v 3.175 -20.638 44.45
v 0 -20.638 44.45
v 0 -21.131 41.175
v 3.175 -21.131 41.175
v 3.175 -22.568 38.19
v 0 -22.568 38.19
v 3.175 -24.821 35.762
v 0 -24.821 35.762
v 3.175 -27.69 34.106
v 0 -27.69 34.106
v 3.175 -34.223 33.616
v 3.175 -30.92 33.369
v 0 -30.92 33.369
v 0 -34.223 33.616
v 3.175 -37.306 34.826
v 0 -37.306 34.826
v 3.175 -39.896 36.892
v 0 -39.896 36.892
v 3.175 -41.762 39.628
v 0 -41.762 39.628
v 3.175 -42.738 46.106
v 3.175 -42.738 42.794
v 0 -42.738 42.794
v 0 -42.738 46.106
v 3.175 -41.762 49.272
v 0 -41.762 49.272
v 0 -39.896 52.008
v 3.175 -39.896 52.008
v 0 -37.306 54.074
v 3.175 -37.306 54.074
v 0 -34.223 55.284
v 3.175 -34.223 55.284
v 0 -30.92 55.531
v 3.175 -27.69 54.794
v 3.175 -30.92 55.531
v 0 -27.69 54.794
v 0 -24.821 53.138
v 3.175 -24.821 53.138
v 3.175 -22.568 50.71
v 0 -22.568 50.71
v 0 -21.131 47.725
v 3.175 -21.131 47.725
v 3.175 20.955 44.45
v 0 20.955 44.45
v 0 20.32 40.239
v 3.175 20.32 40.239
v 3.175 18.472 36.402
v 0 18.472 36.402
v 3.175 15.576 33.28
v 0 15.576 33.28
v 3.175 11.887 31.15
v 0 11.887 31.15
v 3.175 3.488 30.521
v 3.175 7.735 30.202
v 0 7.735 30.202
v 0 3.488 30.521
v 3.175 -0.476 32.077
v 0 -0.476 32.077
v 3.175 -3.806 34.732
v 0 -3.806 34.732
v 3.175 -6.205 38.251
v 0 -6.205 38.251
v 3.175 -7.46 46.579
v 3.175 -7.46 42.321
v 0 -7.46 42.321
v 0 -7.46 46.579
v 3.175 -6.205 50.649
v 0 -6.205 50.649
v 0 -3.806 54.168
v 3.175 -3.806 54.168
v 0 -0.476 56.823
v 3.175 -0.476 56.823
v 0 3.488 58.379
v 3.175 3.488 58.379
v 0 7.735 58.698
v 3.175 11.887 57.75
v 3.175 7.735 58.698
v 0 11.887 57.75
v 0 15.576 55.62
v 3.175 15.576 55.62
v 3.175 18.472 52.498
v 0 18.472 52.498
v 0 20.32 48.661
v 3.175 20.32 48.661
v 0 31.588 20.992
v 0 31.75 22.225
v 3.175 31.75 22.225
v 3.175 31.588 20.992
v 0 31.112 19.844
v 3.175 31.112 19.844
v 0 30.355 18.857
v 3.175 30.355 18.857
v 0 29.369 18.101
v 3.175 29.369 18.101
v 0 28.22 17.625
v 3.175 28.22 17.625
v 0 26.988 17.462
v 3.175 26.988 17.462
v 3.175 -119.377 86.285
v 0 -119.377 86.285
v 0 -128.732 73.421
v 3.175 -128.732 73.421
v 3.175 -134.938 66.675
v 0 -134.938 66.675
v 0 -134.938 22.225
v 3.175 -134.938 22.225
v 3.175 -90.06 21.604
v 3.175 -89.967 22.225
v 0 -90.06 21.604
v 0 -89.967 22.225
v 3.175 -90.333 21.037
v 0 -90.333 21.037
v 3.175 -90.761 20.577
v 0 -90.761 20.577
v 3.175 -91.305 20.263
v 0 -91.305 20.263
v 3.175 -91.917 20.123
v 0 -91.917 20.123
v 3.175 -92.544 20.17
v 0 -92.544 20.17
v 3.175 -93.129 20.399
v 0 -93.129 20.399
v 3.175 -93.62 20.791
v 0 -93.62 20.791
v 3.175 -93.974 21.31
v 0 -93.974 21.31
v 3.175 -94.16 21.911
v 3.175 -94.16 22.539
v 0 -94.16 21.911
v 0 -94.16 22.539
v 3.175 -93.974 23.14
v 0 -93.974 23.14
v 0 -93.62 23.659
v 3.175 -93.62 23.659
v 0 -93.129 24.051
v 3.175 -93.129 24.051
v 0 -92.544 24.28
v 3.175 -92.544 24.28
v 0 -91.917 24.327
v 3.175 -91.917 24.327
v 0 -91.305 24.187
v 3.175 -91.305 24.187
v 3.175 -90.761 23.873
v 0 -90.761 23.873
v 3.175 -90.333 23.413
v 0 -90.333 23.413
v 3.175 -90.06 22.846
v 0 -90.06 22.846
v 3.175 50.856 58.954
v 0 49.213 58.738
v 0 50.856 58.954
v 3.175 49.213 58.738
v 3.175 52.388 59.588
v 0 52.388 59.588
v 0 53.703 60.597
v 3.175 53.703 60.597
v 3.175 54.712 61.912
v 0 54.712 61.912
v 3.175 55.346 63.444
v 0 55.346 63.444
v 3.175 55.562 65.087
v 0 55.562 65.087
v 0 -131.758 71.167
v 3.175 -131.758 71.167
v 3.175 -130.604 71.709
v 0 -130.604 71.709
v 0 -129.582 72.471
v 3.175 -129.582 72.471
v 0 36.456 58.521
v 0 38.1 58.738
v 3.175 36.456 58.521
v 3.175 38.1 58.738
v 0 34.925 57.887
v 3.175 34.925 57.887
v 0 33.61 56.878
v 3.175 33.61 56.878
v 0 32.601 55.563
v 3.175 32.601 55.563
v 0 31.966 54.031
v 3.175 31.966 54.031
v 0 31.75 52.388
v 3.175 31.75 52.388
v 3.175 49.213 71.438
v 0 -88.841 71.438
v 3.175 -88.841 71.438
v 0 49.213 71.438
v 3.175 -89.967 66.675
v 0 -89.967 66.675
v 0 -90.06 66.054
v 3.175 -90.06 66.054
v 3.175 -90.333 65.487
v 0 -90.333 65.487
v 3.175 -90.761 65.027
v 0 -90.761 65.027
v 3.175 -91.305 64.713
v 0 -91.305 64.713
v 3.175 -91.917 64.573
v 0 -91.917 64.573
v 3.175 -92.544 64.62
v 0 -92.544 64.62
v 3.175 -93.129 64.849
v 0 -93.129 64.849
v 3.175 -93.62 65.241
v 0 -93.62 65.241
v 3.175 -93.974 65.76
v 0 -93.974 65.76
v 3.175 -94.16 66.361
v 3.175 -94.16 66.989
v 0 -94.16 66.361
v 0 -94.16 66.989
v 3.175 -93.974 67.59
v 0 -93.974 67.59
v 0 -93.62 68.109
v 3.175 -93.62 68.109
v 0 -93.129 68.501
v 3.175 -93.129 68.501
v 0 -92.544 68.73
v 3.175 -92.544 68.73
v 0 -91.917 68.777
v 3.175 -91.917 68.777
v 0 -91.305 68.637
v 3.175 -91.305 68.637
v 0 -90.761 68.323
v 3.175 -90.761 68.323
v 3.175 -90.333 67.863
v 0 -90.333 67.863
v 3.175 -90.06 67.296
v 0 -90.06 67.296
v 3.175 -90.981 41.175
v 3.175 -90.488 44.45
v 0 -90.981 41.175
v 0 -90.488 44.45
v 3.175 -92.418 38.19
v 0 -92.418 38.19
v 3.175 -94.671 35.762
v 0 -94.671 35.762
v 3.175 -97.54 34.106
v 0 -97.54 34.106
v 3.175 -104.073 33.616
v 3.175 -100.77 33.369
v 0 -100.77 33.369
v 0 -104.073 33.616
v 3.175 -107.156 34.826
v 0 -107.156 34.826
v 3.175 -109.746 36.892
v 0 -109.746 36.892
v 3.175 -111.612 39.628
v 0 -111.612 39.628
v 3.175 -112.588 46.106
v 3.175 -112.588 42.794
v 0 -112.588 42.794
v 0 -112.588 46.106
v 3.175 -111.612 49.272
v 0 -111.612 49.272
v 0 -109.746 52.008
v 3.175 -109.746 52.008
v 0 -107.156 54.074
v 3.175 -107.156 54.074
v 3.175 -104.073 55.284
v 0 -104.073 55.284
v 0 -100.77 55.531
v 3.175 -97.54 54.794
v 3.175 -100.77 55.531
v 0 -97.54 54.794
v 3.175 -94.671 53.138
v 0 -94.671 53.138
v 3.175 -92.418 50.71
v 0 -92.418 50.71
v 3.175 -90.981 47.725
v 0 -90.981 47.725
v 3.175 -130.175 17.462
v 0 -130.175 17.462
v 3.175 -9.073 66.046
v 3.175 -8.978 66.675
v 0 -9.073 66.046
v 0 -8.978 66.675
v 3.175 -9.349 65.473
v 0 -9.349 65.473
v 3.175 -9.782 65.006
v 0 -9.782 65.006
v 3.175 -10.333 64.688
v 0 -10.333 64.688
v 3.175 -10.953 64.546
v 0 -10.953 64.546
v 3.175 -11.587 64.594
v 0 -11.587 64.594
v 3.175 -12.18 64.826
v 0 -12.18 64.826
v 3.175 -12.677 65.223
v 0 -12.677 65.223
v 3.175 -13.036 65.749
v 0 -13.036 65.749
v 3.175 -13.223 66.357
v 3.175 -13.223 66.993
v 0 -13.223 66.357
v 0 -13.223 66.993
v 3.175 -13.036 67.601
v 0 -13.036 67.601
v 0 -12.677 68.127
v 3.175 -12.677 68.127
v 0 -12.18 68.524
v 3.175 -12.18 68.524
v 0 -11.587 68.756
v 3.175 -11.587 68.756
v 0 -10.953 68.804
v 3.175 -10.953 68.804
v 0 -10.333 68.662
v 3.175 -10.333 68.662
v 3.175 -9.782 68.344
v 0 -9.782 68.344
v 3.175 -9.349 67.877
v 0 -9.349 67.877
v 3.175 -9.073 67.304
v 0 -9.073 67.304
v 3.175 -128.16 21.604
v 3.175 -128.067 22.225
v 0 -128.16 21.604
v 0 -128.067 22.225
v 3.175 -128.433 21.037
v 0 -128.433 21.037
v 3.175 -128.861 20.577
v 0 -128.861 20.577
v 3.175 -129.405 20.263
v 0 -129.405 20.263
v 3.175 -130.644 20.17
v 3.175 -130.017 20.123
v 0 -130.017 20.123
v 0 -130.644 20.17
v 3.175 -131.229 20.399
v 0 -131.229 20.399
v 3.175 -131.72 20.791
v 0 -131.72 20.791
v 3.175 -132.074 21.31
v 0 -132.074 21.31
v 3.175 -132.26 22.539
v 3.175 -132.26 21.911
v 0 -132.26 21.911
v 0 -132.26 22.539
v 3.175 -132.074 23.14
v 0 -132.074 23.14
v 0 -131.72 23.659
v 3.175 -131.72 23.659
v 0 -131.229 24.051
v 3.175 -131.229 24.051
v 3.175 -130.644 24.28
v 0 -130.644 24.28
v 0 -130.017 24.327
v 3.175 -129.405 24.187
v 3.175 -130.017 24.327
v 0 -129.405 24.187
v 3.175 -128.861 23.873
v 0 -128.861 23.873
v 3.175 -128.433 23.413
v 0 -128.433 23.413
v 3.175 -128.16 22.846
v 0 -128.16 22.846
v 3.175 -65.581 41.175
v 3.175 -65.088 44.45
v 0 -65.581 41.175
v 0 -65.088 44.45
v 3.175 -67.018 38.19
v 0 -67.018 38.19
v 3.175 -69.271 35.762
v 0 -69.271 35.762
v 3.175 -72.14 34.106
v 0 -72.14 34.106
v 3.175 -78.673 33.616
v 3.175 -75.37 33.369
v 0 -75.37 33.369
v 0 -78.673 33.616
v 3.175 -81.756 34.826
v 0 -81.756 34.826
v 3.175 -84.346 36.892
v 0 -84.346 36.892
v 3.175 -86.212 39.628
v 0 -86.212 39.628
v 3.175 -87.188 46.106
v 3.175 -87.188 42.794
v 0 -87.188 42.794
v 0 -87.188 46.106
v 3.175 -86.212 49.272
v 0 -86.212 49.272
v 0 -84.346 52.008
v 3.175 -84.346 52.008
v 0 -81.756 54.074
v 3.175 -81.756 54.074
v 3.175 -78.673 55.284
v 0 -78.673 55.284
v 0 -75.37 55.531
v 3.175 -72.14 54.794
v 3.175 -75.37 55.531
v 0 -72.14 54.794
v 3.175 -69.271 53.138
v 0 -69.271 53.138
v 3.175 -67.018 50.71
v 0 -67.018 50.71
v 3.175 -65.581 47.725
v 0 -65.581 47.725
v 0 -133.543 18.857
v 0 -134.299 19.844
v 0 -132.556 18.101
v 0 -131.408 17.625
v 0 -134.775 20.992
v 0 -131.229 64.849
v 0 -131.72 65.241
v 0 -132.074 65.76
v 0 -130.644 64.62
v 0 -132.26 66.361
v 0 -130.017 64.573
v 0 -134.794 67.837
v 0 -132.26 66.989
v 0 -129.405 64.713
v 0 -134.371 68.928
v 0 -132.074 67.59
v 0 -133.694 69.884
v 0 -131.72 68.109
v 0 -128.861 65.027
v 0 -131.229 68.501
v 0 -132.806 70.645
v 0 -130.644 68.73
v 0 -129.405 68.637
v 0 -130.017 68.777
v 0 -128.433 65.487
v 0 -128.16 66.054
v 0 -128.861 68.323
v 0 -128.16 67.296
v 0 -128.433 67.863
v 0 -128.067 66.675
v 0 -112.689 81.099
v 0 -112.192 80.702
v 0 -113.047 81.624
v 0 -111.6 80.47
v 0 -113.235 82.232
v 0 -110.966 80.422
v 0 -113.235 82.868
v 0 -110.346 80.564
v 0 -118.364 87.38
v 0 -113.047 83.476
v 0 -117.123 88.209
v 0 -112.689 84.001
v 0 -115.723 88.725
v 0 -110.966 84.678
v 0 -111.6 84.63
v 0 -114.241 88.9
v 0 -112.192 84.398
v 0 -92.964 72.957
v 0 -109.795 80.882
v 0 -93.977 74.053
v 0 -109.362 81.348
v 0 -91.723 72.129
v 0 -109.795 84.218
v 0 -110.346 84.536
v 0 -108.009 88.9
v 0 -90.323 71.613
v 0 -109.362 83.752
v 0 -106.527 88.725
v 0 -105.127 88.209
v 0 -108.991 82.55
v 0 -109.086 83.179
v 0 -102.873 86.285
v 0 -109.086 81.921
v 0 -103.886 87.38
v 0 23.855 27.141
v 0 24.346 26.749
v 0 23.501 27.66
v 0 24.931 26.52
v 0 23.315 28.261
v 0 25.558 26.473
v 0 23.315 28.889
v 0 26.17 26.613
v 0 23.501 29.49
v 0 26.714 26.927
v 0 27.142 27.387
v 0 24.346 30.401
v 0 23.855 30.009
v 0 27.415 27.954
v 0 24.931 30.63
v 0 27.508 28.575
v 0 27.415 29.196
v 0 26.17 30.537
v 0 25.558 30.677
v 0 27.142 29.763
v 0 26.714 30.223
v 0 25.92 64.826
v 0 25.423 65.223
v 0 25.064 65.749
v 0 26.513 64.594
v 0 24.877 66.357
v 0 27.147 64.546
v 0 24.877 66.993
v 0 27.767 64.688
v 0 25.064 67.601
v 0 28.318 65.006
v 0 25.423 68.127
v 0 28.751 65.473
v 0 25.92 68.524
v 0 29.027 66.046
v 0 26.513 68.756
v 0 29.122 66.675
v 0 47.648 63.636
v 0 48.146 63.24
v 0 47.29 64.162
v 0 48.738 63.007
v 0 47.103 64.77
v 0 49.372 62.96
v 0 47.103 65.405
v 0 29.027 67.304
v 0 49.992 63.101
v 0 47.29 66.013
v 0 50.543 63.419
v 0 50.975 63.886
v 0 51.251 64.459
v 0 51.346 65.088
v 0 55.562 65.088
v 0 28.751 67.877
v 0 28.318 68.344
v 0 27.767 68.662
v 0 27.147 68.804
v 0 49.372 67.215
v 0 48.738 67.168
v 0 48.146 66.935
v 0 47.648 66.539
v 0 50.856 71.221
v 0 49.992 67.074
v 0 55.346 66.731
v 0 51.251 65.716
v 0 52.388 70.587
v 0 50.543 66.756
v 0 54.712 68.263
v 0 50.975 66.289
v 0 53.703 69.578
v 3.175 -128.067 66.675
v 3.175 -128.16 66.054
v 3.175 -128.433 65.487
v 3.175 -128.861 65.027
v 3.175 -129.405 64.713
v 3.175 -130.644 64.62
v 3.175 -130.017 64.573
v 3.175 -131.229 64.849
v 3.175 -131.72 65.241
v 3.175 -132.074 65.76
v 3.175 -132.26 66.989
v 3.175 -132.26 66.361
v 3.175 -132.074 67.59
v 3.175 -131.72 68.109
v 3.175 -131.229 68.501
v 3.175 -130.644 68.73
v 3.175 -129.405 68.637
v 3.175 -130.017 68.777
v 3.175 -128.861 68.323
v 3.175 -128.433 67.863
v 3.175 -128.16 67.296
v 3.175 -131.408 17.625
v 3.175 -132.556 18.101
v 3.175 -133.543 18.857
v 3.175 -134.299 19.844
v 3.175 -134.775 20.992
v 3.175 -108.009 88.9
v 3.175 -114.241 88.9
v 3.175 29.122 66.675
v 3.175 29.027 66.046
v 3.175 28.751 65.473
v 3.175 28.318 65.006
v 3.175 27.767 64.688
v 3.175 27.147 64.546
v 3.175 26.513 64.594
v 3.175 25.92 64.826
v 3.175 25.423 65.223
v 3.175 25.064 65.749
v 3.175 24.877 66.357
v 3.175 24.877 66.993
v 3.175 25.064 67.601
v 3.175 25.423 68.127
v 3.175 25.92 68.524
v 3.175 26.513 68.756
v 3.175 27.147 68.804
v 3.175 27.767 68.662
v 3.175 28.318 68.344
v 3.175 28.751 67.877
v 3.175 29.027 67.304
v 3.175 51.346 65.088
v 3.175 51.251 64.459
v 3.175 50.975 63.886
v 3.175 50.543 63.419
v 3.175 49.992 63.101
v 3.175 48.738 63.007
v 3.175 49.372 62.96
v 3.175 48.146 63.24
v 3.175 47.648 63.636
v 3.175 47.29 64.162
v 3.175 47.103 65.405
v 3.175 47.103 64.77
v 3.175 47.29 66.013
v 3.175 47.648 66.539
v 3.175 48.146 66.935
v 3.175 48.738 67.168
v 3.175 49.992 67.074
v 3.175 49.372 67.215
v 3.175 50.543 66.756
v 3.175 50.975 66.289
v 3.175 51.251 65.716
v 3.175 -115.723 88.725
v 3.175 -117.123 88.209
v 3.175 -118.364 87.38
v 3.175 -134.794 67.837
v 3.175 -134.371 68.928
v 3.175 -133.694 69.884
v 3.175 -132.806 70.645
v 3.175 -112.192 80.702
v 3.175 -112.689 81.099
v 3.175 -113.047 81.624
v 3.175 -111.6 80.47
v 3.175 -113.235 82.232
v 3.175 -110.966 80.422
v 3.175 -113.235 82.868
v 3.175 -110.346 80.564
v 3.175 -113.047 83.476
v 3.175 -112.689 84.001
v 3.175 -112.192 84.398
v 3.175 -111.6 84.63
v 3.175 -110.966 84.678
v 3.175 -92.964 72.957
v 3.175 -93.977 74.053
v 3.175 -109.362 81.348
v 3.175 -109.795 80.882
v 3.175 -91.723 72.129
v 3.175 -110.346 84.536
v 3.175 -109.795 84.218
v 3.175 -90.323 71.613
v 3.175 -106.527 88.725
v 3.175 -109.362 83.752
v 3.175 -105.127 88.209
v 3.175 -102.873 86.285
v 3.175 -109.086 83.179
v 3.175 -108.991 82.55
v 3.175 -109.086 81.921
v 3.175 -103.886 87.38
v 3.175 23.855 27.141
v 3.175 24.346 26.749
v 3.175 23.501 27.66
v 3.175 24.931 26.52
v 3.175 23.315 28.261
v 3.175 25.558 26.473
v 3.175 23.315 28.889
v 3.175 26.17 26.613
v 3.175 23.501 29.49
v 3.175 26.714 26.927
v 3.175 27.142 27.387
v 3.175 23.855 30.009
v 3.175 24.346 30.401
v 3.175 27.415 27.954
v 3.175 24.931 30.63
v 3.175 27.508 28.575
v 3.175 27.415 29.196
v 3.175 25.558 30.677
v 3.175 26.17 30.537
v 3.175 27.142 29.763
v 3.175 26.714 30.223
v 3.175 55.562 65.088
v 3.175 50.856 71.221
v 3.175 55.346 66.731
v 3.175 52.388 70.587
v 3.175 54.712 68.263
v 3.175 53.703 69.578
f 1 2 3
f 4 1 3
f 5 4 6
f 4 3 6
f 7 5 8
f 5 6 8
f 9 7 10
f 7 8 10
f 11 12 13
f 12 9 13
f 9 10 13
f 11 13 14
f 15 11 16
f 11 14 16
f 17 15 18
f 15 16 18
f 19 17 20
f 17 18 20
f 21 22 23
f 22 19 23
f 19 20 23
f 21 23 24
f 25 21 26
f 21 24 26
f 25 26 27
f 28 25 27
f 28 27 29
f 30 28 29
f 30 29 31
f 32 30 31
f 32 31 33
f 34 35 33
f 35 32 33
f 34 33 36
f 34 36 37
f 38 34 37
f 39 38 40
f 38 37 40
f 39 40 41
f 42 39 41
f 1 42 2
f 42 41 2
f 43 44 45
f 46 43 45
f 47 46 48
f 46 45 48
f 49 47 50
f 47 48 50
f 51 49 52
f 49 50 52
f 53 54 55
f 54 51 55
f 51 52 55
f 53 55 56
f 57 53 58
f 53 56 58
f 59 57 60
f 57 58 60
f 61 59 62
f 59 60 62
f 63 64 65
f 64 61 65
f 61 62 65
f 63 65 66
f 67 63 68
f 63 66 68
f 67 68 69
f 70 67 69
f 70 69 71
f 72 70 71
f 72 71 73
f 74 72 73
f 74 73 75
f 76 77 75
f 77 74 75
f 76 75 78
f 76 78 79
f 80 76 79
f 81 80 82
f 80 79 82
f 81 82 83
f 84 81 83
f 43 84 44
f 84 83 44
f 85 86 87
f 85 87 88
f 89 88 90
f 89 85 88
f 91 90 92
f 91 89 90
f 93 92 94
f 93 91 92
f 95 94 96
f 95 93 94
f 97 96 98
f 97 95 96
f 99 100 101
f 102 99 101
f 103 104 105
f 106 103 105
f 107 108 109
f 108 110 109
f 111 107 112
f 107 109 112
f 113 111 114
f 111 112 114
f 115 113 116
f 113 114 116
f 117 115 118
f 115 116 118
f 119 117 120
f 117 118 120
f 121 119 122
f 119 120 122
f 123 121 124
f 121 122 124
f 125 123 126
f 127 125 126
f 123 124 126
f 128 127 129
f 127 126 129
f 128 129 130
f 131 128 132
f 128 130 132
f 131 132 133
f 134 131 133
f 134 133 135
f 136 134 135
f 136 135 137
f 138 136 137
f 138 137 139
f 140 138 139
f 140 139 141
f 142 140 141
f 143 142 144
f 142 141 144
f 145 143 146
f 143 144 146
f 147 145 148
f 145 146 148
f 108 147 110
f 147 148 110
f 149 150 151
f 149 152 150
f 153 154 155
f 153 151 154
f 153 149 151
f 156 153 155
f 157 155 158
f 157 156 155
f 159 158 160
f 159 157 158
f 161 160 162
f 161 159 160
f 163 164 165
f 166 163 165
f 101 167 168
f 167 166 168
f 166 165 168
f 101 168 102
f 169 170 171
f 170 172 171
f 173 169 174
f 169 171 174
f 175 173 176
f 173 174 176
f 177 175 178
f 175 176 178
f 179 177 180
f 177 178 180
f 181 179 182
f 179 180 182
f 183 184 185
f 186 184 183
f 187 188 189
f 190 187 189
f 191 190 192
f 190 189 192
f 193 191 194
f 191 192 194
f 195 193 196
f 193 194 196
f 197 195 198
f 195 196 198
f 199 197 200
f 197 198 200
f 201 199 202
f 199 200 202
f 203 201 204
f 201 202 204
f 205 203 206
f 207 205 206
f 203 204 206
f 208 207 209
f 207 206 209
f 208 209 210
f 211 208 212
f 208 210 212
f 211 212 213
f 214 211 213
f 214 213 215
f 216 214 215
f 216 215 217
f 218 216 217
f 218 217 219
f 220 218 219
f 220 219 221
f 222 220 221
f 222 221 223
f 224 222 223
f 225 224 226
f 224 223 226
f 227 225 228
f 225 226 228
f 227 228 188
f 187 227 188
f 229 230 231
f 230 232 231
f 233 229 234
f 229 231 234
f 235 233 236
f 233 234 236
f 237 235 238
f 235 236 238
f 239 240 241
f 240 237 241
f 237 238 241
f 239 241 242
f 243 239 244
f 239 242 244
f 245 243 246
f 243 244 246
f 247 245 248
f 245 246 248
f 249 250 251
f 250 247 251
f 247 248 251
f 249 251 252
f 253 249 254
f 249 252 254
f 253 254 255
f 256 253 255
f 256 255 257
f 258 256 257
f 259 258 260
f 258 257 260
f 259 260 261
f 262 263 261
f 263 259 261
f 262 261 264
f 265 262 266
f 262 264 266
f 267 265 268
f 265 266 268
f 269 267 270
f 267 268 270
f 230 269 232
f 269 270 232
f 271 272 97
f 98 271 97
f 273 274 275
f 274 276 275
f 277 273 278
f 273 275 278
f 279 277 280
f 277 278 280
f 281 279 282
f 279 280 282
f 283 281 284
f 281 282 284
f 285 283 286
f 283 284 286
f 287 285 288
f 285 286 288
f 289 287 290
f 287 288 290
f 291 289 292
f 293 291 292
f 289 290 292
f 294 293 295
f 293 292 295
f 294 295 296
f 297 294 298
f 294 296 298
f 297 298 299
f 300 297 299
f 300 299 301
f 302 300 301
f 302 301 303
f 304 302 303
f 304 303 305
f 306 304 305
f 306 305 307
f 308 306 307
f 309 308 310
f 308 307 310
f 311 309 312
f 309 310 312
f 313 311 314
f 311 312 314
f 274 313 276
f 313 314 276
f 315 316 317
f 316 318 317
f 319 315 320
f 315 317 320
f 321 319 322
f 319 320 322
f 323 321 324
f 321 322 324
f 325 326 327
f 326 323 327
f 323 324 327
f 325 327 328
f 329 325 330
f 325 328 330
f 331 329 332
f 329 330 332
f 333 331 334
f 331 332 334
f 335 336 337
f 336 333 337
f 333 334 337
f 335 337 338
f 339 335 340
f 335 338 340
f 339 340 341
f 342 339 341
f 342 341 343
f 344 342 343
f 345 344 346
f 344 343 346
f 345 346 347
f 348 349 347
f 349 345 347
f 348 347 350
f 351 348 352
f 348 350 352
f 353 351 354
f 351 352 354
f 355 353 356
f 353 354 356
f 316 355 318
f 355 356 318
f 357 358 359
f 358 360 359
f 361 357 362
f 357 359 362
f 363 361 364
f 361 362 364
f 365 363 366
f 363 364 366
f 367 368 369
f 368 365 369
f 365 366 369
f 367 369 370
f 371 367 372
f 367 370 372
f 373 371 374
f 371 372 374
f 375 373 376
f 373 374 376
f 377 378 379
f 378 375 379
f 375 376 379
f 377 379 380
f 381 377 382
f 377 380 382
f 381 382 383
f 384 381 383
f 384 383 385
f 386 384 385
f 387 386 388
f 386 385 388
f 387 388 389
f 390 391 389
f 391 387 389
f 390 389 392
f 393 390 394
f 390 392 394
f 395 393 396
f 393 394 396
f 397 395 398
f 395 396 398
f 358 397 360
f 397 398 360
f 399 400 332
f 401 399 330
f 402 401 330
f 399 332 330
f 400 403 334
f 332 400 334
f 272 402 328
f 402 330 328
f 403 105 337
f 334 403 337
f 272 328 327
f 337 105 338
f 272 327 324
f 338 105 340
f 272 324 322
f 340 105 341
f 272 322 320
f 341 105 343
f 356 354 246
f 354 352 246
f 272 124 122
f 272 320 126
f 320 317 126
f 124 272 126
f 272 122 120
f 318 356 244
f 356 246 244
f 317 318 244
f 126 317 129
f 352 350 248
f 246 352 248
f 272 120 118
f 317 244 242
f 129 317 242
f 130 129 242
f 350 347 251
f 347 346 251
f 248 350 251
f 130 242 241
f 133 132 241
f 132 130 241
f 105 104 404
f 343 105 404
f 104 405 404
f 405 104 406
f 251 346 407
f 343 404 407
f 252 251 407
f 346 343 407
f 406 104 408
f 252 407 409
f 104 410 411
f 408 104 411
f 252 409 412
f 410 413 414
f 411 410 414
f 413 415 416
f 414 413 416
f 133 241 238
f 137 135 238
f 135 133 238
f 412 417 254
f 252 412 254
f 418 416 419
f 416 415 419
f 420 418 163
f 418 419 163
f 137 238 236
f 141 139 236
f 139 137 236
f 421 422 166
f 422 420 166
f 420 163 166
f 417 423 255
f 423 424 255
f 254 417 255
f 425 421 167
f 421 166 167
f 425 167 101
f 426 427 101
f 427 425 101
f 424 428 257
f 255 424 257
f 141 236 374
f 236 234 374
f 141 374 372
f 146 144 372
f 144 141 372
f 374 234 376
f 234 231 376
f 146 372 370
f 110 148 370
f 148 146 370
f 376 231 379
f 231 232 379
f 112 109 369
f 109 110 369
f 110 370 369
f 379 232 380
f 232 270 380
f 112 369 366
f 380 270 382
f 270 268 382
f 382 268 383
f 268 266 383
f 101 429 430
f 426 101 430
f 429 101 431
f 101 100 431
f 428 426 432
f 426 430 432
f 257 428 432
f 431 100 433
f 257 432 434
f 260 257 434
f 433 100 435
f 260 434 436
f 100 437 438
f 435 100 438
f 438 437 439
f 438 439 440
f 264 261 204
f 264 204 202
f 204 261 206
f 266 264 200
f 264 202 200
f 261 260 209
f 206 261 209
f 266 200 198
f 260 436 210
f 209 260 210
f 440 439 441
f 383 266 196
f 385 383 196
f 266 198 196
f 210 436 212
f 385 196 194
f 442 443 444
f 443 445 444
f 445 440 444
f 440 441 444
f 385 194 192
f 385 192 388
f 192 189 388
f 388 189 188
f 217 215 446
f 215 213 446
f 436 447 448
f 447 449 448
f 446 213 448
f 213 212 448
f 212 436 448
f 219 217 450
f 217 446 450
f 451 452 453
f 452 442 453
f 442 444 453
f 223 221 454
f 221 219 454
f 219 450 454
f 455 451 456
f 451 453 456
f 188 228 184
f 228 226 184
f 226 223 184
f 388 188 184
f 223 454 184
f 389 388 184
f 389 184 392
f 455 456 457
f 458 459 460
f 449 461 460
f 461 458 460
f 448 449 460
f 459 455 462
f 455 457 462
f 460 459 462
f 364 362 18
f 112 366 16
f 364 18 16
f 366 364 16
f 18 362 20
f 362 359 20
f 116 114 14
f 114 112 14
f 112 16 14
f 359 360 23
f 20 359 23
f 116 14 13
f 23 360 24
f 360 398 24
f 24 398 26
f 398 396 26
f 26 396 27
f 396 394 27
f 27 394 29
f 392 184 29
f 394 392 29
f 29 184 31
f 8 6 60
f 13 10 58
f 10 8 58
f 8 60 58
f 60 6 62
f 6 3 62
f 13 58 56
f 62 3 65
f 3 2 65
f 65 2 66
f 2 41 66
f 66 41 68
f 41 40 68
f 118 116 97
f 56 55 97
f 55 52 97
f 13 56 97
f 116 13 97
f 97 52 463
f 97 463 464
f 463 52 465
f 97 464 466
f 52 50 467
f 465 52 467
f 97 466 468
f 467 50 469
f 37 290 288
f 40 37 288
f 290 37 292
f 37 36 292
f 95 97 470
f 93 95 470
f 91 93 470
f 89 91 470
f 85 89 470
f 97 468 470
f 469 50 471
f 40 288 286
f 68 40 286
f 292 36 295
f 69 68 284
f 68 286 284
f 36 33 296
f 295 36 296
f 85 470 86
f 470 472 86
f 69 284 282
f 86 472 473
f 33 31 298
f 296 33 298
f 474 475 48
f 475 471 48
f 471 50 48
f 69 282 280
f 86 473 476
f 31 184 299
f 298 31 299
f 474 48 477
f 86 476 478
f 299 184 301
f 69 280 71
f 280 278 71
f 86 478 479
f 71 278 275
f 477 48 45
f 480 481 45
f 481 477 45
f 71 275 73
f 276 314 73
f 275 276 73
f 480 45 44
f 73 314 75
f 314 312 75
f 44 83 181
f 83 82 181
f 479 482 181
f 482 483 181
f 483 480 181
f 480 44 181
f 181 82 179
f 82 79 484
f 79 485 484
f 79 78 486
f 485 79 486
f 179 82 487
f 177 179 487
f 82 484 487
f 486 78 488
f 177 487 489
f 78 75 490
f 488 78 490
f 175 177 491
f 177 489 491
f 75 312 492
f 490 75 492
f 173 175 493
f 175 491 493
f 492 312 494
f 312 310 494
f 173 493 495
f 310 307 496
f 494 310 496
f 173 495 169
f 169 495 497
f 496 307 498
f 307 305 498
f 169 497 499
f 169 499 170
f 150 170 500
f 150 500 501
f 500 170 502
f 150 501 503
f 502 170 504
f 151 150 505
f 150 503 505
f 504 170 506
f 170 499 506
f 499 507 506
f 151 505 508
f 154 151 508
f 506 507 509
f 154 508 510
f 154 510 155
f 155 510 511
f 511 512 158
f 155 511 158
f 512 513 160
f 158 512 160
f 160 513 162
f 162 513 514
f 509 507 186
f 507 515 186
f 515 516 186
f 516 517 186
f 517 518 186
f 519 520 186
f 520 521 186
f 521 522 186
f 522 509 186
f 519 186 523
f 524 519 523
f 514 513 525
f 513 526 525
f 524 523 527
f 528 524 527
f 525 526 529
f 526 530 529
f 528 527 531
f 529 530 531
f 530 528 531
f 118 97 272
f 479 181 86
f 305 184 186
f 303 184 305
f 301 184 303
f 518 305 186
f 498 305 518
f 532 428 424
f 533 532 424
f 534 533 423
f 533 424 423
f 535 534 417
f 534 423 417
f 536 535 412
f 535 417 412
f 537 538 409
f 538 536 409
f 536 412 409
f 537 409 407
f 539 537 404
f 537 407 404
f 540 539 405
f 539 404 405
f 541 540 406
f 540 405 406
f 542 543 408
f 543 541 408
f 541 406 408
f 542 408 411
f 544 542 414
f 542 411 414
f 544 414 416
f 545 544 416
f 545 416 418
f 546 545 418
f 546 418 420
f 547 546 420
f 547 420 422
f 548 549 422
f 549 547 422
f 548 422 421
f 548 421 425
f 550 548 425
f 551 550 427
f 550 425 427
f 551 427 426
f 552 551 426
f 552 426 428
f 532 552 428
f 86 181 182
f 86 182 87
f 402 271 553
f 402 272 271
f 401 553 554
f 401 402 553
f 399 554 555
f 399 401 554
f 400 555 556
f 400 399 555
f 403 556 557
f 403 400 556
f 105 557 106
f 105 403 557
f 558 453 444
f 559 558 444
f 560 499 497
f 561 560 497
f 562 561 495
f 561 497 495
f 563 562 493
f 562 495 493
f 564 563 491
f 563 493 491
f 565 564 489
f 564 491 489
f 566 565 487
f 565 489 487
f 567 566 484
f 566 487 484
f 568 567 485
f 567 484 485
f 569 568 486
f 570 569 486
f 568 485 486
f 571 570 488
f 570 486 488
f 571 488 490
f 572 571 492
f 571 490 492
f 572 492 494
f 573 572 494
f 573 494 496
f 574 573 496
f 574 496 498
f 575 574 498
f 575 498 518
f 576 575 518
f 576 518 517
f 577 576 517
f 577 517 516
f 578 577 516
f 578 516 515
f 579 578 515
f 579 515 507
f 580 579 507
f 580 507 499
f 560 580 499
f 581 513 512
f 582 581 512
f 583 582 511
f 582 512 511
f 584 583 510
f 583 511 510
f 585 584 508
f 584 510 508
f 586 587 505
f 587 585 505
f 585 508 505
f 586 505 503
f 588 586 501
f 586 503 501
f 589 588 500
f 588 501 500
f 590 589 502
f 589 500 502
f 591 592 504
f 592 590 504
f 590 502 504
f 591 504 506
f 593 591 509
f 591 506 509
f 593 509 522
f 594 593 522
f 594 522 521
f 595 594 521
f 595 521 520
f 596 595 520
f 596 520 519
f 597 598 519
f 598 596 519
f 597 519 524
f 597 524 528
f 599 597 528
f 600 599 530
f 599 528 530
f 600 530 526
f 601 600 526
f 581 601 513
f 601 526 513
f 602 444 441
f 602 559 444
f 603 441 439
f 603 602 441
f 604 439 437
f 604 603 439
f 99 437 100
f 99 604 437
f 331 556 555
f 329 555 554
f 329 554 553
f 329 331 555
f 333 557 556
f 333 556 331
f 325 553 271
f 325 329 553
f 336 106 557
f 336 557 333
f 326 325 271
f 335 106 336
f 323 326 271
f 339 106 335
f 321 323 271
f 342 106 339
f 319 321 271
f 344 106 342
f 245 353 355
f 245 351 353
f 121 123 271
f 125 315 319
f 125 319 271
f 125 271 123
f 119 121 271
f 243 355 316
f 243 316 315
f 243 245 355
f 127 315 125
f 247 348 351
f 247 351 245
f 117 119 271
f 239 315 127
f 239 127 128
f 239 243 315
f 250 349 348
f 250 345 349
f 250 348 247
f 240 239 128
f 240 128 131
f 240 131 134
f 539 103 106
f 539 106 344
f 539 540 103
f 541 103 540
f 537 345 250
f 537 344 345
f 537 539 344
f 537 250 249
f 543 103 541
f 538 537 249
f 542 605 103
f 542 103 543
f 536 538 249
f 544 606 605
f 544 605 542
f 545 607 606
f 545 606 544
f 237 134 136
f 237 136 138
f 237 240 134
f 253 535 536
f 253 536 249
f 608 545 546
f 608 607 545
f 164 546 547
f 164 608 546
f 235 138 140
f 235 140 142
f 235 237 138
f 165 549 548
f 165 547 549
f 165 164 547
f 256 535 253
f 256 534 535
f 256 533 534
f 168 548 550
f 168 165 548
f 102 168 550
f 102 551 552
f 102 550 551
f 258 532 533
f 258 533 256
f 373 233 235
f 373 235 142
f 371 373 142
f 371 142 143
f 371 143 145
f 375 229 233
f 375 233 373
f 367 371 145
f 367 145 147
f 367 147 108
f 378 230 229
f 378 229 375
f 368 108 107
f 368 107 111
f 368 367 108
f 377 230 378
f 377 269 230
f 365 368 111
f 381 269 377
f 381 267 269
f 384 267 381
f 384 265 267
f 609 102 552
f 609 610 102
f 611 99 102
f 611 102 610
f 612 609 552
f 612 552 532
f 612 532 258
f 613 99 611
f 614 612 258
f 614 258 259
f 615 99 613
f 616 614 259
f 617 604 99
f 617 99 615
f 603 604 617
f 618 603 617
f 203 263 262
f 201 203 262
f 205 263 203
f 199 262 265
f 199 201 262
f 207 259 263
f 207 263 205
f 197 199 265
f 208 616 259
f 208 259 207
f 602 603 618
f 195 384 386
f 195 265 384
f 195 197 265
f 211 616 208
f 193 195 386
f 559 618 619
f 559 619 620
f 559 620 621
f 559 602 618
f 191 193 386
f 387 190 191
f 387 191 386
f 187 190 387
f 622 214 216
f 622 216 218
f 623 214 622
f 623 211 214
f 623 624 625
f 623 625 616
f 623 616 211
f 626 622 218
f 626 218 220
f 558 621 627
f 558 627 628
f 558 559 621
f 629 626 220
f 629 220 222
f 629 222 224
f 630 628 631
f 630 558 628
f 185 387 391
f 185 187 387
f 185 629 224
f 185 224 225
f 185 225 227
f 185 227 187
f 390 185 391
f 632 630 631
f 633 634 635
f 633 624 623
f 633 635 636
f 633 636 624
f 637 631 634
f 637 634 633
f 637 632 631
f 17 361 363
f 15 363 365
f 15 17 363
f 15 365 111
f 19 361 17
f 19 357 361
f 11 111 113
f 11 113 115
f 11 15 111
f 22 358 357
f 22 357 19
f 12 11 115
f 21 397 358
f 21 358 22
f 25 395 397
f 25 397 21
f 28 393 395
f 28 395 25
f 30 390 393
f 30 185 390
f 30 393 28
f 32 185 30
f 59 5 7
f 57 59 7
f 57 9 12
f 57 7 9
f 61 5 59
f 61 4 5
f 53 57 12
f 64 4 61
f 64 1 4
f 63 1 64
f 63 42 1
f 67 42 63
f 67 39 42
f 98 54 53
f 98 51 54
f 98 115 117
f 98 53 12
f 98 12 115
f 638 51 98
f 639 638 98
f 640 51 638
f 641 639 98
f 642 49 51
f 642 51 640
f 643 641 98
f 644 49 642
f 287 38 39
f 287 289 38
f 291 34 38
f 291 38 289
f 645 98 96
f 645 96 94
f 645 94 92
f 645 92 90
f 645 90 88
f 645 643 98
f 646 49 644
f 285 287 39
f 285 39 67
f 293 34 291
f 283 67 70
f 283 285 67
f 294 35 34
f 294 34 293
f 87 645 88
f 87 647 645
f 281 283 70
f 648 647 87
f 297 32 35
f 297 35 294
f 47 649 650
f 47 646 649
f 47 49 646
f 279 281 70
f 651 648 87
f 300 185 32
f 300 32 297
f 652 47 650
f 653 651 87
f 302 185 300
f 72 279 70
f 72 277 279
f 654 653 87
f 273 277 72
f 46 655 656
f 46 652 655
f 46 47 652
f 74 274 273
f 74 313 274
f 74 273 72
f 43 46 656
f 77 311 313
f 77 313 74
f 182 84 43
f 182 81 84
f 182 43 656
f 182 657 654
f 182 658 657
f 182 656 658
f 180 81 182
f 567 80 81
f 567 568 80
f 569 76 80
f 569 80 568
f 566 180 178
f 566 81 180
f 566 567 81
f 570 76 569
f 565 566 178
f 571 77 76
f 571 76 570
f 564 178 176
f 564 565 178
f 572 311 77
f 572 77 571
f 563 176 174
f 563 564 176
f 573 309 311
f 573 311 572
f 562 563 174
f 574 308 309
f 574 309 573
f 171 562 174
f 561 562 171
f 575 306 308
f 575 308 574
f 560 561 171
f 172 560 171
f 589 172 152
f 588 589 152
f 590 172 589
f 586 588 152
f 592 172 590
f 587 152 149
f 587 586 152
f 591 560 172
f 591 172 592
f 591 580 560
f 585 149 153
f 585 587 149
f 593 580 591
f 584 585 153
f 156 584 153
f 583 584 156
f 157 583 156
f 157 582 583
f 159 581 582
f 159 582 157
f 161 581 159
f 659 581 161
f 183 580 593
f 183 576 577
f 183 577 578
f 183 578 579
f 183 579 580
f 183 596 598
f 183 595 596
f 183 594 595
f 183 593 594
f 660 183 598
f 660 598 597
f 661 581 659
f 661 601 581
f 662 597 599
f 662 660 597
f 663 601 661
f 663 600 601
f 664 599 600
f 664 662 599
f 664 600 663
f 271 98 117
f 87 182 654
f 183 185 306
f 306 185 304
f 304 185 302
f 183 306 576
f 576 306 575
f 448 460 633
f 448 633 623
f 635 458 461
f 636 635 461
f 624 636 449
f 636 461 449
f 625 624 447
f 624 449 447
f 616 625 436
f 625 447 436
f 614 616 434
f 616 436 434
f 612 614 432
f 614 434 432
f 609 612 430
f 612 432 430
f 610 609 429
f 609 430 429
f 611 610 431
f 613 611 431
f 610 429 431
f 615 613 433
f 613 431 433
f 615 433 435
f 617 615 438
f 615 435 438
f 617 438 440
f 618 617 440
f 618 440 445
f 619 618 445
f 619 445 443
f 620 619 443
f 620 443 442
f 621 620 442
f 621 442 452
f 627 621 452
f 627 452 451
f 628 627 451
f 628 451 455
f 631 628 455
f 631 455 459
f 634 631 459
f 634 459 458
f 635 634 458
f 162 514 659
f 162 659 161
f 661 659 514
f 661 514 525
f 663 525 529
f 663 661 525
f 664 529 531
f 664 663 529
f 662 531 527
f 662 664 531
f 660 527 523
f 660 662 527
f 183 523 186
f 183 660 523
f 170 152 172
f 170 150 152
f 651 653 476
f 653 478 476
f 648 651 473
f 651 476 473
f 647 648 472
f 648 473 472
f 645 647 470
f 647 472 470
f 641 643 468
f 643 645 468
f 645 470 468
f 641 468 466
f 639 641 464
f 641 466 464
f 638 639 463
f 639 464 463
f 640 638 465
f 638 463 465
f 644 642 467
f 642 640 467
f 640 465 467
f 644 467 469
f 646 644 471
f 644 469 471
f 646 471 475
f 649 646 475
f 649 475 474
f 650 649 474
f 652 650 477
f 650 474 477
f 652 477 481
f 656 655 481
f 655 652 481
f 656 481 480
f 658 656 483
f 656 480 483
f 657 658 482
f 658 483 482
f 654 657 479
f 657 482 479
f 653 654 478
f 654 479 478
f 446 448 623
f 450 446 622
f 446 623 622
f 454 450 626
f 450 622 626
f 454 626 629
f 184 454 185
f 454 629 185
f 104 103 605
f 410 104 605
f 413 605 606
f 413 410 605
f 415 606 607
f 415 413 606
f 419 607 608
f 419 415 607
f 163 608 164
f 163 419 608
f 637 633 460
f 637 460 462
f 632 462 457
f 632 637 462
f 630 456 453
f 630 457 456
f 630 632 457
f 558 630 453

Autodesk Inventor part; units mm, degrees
ref_plane "YZ Plane" through (0, 0, 0) normal (1, 0, 0) x (0, 1, 0)
ref_plane "XZ Plane" through (0, 0, 0) normal (0, 1, 0) x (-1, 0, 0)
ref_plane "XY Plane" through (0, 0, 0) normal (0, 0, 1) x (1, 0, 0)
sketch "Sketch1" plane through (0, 0, 0) normal (1, 0, 0) x (0, 1, 0)
  circle A0 centre (-31.75, 44.45) radius 11.1125
  circle A1 centre (-76.2, 44.45) radius 11.1125
  circle A2 centre (-101.6, 44.45) radius 11.1125
  line L0 (-130.175, 71.4375) -> (-92.075, 71.4375)
  arc A3 (-130.175, 71.4375) -> (-134.9375, 66.675) centre (-130.175, 66.675) ccw
  arc A4 (26.9875, 17.4625) -> (31.75, 22.225) centre (26.9875, 22.225) ccw
  line L1 (-130.175, 17.4625) -> (-92.075, 17.4625)
  circle A5 centre (25.4, 28.575) radius 2.1082
  circle A6 centre (-92.075, 66.675) radius 2.1082
  line L2 (31.75, 66.675) -> (31.75, 22.225)
  circle A7 centre (-92.075, 22.225) radius 2.1082
  arc A8 (-134.9375, 22.225) -> (-130.175, 17.4625) centre (-130.175, 22.225) ccw
  circle A9 centre (-130.175, 66.675) radius 2.1082
  line L3 (-134.9375, 66.675) -> (-134.9375, 22.225)
  circle A10 centre (-130.175, 22.225) radius 2.1082
  line L4 (-92.075, 71.4375) -> (26.9875, 71.4375)
  arc A11 (31.75, 66.675) -> (26.9875, 71.4375) centre (26.9875, 66.675) ccw
  circle A12 centre (26.9875, 66.675) radius 2.1345
  line L5 (-92.075, 17.4625) -> (26.9875, 17.4625)
  line L6 (26.9875, 66.675) -> (-17.4625, 66.675)
  line L7 (-17.4625, 66.675) -> (-11.1125, 66.675)
  line L8 (-17.4625, 66.675) -> (-23.8125, 66.675)
  circle A13 centre (-11.1125, 66.675) radius 2.1345
  line L9 (26.9875, 44.45) -> (6.6675, 44.45)
  circle A14 centre (6.6675, 44.45) radius 14.2875
  line L10 (-130.175, 22.225) -> (-92.075, 22.225)
  line L11 (-111.125, 22.225) -> (-111.125, 6.35)
  circle A15 centre (-111.125, 6.35) radius 2.1336
  line L12 (-111.125, 6.35) -> (-111.125, 0)
  line L13 (-111.125, 0) -> (-117.475, 0)
  line L14 (-111.125, 0) -> (-104.775, 0)
  line L15 (-117.475, 0) -> (-130.175, 17.4625)
  line L16 (-104.775, 0) -> (-92.075, 17.4625)
  line L17 (-130.175, 66.675) -> (-92.075, 66.675)
  line L18 (-111.125, 66.675) -> (-111.125, 82.55)
  circle A16 centre (-111.125, 82.55) radius 2.1336
  line L19 (-111.125, 82.55) -> (-111.125, 88.9)
  line L20 (-111.125, 88.9) -> (-117.475, 88.9)
  line L21 (-117.475, 88.9) -> (-104.775, 88.9)
  line L22 (-104.775, 88.9) -> (-92.075, 71.4375)
  line L23 (-117.475, 88.9) -> (-130.175, 71.4375)
  line L24 (26.9875, 71.4375) -> (55.5625, 71.4375)
  line L25 (55.5625, 71.4375) -> (55.5625, 58.7375)
  line L26 (55.5625, 58.7375) -> (31.75, 58.7375)
  line L27 (55.5625, 65.0875) -> (49.2125, 65.0875)
  circle A17 centre (49.2125, 65.0875) radius 2.1336
  point P0 (0, 0)
  point P1 (26.9875, 71.4375)
  dimension "d2" = 6.35
  dimension "d3" = 6.35
  dimension "d4" = 44.45
  dimension "d5" = 20.32
  dimension "d6" = 28.575
  dimension "d7" = 4.2672
  dimension "d8" = 6.35
  dimension "d9" = 6.35
  dimension "d10" = 6.35
  dimension "d11" = 15.875
  dimension "d12" = 4.2672
  dimension "d13" = 6.35
  dimension "d14" = 6.35
  dimension "d15" = 12.7
  dimension "d21" = 28.575
  dimension "d22" = 6.35
  dimension "d23" = 4.2672
extrude "Extrusion1" add sketch "Sketch1" along normal blind 3.175 contours L23 L20 L19 A16 L18 L0 | L0 L4 A11 L2 A4 L5 L1 A8 L3 A3 | L18 A16 L19 L21 L22 L0 | L24 L25 L26 L2 A11
fillet "Fillet1" radius 6.35 4 edges at (1.5875, -130.175, 71.4375) (1.5875, -117.475, 88.9) (1.5875, -104.775, 88.9) (1.5875, -92.075, 71.4375)
fillet "Fillet3" radius 6.35 3 edges at (1.5875, 31.75, 58.7375) (1.5875, 55.5625, 58.7375) (1.5875, 55.5625, 71.4375)
properties part number "winch plate"
